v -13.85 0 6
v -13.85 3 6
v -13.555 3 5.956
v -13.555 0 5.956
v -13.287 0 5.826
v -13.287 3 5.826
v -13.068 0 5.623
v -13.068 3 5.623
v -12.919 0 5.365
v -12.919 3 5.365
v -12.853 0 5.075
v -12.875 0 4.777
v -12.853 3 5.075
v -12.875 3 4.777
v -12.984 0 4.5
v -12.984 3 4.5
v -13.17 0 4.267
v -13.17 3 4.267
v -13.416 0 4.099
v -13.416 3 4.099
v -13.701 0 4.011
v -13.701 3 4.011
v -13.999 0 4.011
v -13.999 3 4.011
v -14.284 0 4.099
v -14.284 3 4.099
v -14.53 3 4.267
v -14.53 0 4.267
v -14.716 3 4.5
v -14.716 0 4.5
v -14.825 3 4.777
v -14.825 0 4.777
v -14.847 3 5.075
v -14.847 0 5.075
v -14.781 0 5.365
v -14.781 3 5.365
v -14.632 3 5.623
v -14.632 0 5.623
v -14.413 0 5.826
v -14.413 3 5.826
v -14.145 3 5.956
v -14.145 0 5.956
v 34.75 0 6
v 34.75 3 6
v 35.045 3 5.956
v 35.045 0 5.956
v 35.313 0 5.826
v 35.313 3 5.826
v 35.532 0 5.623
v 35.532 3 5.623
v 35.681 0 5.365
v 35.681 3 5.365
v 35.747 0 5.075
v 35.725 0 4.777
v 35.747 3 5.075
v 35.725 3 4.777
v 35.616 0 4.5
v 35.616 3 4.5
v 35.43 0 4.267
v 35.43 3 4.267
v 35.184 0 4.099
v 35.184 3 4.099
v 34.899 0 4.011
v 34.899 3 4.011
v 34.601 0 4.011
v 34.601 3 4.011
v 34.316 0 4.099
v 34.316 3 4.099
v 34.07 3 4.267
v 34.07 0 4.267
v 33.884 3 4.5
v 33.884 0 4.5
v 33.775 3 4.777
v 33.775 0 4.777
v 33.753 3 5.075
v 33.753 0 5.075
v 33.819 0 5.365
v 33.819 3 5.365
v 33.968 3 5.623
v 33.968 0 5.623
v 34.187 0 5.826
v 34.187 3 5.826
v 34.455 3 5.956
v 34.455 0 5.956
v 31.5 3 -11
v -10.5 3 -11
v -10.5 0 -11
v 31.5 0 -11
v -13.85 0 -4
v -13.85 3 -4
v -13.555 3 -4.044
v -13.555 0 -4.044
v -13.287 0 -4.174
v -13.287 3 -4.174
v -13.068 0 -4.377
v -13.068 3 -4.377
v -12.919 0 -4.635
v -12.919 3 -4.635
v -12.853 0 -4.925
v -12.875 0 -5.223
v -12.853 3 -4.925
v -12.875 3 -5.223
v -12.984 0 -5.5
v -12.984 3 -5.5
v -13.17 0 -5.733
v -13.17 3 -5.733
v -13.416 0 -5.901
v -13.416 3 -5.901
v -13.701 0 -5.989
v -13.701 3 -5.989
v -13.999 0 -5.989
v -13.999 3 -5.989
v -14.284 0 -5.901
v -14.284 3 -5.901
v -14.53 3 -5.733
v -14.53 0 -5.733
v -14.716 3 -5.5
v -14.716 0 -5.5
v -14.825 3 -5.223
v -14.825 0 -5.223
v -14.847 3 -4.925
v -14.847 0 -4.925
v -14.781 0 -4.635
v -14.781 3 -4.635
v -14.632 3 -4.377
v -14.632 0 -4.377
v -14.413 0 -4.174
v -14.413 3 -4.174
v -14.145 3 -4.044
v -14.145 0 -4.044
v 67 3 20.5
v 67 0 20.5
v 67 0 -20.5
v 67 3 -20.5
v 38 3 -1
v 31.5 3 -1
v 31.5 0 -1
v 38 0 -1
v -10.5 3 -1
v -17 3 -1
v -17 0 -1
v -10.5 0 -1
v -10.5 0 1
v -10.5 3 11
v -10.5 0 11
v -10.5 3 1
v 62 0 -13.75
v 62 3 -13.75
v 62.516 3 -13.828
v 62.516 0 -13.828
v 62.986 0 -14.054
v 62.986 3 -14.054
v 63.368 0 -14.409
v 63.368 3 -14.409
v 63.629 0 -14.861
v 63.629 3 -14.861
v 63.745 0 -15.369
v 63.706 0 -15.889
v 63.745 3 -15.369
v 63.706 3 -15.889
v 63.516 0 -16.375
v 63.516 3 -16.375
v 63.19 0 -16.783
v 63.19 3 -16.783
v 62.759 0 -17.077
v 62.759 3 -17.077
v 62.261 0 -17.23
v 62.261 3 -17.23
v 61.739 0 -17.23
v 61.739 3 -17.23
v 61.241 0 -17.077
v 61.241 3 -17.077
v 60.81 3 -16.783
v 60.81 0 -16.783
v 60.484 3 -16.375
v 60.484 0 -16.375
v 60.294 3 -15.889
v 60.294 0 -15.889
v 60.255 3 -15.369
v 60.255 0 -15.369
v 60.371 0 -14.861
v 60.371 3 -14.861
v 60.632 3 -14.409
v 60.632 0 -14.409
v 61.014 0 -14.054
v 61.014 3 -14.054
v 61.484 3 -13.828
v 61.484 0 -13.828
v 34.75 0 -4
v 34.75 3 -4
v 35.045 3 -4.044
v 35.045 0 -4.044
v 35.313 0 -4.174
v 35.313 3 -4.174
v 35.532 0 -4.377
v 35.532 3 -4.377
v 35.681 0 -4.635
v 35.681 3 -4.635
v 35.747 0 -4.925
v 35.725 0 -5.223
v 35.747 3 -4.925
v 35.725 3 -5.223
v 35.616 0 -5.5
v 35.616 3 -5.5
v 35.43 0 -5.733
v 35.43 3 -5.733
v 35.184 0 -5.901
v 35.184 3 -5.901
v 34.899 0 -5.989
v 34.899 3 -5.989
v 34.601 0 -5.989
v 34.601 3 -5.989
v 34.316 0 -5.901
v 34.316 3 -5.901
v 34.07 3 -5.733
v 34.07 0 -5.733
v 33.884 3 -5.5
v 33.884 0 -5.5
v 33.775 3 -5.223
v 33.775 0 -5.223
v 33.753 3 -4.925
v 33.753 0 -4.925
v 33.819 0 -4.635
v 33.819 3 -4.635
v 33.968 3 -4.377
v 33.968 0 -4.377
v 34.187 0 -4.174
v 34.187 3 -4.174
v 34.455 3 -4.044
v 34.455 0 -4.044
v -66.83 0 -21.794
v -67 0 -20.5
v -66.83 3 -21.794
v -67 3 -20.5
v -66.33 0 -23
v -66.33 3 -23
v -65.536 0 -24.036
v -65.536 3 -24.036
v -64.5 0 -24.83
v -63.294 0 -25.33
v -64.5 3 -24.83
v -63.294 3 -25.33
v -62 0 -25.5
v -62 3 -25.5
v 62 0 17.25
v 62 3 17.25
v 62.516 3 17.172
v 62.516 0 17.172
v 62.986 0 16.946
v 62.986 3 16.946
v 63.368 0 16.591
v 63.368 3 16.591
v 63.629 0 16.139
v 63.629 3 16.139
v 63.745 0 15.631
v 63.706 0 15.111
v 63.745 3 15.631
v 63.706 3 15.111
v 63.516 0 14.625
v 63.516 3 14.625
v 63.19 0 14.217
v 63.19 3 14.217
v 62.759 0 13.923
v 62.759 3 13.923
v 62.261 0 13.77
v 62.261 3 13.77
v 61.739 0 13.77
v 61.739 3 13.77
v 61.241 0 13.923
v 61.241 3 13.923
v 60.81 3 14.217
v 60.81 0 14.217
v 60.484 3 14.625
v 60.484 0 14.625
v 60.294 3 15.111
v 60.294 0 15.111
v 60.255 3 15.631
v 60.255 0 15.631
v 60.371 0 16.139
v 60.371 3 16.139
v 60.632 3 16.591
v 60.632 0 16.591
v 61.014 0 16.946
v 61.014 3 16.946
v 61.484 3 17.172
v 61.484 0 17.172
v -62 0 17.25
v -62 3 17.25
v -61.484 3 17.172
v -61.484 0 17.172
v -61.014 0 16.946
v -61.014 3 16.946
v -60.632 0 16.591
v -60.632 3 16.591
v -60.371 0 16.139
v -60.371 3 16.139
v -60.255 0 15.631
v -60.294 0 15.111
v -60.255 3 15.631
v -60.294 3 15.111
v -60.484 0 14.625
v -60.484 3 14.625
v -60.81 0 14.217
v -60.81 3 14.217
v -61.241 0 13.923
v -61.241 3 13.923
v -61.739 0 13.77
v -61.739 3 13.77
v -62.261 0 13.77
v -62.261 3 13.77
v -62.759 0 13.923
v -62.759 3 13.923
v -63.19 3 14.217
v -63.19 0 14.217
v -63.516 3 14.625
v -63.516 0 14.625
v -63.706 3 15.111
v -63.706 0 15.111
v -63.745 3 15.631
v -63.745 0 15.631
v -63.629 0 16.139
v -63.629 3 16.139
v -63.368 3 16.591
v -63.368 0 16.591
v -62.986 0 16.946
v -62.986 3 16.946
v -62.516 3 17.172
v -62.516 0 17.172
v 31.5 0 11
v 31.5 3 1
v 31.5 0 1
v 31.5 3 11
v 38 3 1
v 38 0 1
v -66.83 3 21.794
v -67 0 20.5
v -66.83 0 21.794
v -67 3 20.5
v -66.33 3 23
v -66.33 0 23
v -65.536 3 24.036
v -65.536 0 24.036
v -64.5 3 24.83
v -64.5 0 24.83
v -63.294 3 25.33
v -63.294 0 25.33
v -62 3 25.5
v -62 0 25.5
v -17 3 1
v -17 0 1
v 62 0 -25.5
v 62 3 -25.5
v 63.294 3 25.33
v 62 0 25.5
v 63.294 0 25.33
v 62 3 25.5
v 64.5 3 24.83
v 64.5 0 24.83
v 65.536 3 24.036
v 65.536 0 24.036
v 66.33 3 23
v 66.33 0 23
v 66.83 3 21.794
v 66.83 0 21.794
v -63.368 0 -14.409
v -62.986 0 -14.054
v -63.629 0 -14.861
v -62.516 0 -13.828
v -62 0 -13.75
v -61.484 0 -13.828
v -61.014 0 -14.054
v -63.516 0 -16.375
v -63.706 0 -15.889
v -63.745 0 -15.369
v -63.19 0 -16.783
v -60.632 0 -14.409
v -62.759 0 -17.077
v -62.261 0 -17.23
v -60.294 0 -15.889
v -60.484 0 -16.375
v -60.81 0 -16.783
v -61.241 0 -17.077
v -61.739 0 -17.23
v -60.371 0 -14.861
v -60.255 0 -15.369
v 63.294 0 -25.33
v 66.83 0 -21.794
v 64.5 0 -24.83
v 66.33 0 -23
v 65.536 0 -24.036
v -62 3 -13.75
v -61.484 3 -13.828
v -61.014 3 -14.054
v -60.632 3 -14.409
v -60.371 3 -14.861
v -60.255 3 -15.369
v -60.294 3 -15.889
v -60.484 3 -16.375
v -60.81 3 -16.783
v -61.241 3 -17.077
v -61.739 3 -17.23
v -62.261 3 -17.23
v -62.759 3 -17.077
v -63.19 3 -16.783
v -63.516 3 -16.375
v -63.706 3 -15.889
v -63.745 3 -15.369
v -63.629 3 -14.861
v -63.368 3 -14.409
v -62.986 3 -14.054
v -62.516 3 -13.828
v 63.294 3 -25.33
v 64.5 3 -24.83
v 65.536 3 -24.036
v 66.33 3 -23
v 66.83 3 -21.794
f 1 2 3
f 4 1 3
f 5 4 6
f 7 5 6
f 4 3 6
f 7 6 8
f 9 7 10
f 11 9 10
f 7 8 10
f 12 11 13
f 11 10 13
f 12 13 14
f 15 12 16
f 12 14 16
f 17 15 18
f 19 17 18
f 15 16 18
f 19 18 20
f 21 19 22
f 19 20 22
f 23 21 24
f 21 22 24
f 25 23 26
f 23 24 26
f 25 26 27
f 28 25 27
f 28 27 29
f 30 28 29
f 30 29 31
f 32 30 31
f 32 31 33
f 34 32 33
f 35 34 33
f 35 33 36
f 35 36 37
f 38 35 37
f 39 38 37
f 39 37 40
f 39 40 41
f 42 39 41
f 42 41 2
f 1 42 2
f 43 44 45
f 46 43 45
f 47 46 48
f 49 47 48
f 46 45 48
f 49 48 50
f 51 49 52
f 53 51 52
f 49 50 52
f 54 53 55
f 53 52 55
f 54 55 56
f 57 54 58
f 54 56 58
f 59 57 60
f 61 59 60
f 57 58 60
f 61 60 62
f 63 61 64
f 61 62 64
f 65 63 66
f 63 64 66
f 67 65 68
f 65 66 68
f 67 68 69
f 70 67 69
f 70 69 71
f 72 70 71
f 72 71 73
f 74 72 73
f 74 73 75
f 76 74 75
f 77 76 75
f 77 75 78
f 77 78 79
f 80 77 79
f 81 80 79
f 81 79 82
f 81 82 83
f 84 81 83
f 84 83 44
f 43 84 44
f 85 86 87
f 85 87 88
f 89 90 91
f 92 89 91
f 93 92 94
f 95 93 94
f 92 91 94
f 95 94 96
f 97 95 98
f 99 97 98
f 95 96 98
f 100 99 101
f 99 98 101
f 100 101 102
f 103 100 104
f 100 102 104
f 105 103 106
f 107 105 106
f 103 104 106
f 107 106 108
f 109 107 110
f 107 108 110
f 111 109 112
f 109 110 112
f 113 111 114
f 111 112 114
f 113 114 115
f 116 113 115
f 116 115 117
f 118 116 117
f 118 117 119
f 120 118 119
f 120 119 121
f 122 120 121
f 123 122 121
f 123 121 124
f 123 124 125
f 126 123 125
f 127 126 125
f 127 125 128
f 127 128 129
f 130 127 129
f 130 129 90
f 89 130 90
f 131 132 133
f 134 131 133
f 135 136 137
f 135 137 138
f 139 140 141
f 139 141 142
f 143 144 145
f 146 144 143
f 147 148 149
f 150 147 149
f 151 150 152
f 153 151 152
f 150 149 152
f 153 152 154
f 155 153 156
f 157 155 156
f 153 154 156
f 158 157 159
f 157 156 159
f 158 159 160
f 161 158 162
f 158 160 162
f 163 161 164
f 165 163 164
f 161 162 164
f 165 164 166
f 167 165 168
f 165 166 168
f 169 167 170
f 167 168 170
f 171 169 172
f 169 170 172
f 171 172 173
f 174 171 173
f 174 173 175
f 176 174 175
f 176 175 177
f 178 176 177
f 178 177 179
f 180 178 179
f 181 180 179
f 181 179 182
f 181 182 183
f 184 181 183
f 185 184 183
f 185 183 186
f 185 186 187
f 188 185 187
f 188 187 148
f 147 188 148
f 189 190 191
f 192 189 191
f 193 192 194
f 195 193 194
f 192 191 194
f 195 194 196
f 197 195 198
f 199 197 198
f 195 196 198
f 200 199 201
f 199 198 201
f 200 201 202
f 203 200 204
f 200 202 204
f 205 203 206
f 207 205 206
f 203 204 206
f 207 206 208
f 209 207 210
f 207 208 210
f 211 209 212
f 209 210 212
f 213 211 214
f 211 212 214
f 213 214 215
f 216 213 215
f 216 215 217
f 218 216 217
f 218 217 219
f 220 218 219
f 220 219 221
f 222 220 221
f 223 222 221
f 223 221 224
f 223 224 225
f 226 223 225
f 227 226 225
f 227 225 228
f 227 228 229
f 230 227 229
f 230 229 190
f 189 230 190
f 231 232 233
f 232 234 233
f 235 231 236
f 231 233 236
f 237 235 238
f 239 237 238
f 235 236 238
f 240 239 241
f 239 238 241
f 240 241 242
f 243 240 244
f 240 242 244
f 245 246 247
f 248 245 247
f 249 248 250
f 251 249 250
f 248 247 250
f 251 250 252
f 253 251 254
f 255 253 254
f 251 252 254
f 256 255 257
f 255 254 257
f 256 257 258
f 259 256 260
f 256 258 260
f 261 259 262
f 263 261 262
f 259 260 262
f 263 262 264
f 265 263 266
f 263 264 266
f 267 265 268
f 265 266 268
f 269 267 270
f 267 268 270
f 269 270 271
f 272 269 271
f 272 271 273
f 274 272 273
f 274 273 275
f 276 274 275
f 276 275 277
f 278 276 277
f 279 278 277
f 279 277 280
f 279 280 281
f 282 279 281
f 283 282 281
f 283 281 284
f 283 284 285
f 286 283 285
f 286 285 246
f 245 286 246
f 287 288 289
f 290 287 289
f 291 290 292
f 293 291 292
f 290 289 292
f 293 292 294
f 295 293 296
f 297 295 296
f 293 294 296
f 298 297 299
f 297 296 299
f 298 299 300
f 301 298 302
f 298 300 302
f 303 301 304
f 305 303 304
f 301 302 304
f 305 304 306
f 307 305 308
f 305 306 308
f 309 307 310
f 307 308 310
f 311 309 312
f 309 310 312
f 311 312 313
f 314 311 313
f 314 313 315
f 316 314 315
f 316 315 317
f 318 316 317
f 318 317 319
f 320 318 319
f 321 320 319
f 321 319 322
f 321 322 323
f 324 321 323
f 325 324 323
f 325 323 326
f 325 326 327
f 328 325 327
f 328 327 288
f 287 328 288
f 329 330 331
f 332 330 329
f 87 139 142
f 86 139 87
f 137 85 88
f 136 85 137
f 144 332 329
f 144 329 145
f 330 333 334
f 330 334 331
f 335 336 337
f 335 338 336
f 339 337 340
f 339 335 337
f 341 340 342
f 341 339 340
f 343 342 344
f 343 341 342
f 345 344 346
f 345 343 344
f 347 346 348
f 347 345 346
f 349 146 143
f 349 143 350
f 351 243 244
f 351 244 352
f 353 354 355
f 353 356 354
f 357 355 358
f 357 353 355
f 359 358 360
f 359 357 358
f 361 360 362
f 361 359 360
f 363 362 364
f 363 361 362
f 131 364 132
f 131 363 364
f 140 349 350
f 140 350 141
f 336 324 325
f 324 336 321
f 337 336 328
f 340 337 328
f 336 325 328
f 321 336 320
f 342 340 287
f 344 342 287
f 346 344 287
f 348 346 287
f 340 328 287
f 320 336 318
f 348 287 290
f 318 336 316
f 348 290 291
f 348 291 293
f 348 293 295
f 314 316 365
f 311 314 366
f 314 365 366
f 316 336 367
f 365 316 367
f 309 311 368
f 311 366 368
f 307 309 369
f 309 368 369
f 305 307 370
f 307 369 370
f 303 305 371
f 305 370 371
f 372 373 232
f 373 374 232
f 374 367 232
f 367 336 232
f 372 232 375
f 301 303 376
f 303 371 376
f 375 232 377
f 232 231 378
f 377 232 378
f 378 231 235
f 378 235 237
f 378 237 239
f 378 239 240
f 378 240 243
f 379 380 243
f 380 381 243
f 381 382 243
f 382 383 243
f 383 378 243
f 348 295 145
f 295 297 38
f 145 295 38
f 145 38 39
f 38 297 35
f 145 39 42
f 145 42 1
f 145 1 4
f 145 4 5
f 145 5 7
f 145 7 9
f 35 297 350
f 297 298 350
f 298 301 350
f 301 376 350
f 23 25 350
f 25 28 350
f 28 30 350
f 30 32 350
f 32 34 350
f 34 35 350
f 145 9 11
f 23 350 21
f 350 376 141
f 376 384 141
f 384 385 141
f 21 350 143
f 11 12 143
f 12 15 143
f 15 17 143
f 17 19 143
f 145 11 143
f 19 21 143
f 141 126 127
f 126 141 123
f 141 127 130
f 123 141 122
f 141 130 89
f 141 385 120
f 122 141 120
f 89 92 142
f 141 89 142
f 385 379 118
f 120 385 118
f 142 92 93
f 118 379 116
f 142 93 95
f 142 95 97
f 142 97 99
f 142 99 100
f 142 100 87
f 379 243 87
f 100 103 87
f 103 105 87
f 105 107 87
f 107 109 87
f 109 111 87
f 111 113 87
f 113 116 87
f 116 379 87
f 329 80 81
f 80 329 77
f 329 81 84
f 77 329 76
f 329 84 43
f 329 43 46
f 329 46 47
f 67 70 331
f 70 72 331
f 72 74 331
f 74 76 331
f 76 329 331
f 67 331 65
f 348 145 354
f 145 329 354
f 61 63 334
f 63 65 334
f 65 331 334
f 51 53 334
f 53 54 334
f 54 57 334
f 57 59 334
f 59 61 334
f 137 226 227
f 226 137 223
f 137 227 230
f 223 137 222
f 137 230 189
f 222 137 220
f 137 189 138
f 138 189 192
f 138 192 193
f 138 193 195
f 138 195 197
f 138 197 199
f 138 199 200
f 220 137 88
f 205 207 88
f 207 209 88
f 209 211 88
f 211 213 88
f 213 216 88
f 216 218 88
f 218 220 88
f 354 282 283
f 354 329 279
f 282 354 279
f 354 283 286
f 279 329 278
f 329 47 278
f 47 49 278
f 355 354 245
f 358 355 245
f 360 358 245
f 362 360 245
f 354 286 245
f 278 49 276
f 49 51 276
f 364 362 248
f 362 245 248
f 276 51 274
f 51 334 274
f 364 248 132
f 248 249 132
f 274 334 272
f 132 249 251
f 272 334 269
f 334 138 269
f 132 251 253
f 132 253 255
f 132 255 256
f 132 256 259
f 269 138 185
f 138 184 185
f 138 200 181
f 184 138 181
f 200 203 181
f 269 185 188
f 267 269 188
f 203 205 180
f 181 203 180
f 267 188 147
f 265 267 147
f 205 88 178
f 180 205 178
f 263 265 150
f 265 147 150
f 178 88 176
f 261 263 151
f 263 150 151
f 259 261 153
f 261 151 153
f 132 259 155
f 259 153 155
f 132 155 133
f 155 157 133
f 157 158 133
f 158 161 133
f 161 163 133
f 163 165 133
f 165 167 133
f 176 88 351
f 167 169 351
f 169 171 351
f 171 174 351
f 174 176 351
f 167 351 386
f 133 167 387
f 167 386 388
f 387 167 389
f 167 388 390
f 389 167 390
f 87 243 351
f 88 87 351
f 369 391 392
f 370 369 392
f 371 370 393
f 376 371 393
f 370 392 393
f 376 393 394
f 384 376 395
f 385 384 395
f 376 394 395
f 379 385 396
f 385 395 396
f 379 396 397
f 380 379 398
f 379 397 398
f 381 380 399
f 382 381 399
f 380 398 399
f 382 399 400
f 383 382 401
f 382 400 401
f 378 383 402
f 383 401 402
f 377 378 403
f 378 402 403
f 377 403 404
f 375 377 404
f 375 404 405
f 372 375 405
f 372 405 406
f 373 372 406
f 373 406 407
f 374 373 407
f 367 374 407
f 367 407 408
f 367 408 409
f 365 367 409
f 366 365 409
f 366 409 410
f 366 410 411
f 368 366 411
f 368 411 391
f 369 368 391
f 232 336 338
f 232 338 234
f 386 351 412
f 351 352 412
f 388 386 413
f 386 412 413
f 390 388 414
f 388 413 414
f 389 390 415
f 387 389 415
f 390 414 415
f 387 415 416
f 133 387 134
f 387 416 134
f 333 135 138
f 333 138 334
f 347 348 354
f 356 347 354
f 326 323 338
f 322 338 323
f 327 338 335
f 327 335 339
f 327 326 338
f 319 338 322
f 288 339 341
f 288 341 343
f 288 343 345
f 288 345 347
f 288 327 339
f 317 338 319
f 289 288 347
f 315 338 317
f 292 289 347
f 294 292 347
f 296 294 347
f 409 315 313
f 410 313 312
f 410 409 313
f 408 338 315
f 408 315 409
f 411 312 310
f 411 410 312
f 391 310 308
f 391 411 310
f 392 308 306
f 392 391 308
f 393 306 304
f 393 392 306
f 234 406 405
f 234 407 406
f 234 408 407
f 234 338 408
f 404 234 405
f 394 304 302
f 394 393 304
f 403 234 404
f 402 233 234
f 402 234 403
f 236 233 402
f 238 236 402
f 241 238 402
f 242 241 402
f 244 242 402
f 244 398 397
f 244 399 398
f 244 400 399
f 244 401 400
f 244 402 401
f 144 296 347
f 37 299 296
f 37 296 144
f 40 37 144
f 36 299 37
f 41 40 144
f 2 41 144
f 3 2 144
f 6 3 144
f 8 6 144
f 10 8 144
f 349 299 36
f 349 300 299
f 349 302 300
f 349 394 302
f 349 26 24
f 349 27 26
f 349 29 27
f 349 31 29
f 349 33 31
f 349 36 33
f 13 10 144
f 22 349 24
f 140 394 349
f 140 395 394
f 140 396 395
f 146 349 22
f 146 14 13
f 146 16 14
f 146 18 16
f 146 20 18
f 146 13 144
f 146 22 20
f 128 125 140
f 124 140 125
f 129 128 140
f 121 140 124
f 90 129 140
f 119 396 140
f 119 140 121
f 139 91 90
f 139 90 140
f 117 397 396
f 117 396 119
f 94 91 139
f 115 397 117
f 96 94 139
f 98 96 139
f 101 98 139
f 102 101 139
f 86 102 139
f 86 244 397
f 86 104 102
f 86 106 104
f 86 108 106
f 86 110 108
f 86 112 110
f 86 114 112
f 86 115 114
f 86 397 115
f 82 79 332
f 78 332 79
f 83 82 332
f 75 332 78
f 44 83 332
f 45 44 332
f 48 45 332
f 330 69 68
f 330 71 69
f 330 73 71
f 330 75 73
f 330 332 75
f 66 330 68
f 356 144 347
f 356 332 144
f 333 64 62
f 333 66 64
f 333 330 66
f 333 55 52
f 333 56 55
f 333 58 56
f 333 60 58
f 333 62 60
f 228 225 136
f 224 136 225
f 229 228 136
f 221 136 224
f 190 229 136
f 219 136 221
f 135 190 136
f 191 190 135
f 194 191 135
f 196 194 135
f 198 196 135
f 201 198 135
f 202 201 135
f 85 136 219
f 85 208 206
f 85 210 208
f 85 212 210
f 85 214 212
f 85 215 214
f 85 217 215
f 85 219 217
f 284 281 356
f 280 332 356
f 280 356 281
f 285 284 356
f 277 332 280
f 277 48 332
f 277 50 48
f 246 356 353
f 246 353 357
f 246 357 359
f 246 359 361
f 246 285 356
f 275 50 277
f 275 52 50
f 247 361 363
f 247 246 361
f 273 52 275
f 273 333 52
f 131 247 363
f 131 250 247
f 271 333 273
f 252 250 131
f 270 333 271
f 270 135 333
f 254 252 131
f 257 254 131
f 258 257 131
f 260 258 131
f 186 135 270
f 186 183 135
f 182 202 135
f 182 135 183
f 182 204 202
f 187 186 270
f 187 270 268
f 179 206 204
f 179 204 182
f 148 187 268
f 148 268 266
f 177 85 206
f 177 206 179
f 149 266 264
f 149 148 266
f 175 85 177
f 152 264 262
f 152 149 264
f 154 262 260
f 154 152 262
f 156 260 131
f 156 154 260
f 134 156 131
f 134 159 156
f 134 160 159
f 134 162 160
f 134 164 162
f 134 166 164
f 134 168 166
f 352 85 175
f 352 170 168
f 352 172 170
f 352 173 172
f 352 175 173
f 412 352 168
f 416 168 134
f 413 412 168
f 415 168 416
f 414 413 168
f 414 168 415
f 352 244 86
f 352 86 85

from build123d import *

# Parameters (mm, degrees)
SKETCH_1_W          = 134
SKETCH_1_H          = 51
EXTRUDE_1_DEPTH     = 3
CUT_EXTRUDE_1_REACH = 73.751
SKETCH_2_R          = 1.75
CUT_EXTRUDE_2_REACH = 73.751
SKETCH_3_R          = 1
FILLET_1_R          = 5


with BuildPart() as part:
    # 스케치1 → 보스-돌출1 (new body)
    with BuildSketch(Plane(origin=(0, 0, 0), x_dir=(1, 0, 0), z_dir=(0, 1, 0))):
        Rectangle(SKETCH_1_W, SKETCH_1_H)
    extrude(amount=EXTRUDE_1_DEPTH)

    # 스케치2 → 컷-돌출1 (cut, up to next)
    with BuildSketch(Plane(origin=(0, 3, 0), x_dir=(1, 0, 0), z_dir=(0, 1, 0)), mode=Mode.PRIVATE) as cut_extrude_1_sk1:
        with Locations(Location((-62, 15.5, 0), (0, 0, 270))):
            Circle(SKETCH_2_R)
    cut_extrude_1_tool1 = extrude(cut_extrude_1_sk1.sketch, amount=-CUT_EXTRUDE_1_REACH, mode=Mode.PRIVATE) & part.part
    # 스케치2 → 컷-돌출1 (cut, up to next)
    with BuildSketch(Plane(origin=(0, 3, 0), x_dir=(1, 0, 0), z_dir=(0, 1, 0)), mode=Mode.PRIVATE) as cut_extrude_1_sk2:
        with Locations(Location((-62, -15.5, 0), (0, 0, 270))):
            Circle(SKETCH_2_R)
    cut_extrude_1_tool2 = extrude(cut_extrude_1_sk2.sketch, amount=-CUT_EXTRUDE_1_REACH, mode=Mode.PRIVATE) & part.part
    # 스케치2 → 컷-돌출1 (cut, up to next)
    with BuildSketch(Plane(origin=(0, 3, 0), x_dir=(1, 0, 0), z_dir=(0, 1, 0)), mode=Mode.PRIVATE) as cut_extrude_1_sk3:
        with Locations(Location((62, 15.5, 0), (0, 0, 270))):
            Circle(SKETCH_2_R)
    cut_extrude_1_tool3 = extrude(cut_extrude_1_sk3.sketch, amount=-CUT_EXTRUDE_1_REACH, mode=Mode.PRIVATE) & part.part
    # 스케치2 → 컷-돌출1 (cut, up to next)
    with BuildSketch(Plane(origin=(0, 3, 0), x_dir=(1, 0, 0), z_dir=(0, 1, 0)), mode=Mode.PRIVATE) as cut_extrude_1_sk4:
        with Locations(Location((62, -15.5, 0), (0, 0, 270))):
            Circle(SKETCH_2_R)
    cut_extrude_1_tool4 = extrude(cut_extrude_1_sk4.sketch, amount=-CUT_EXTRUDE_1_REACH, mode=Mode.PRIVATE) & part.part
    add(cut_extrude_1_tool1.solids().sort_by_distance((-62, 3, -15.5))[0], mode=Mode.SUBTRACT)
    add(cut_extrude_1_tool2.solids().sort_by_distance((-62, 3, 15.5))[0], mode=Mode.SUBTRACT)
    add(cut_extrude_1_tool3.solids().sort_by_distance((62, 3, -15.5))[0], mode=Mode.SUBTRACT)
    add(cut_extrude_1_tool4.solids().sort_by_distance((62, 3, 15.5))[0], mode=Mode.SUBTRACT)

    # 스케치3 → 컷-돌출2 (cut, up to next)
    with BuildSketch(Plane(origin=(0, 3, 0), x_dir=(1, 0, 0), z_dir=(0, 1, 0)), mode=Mode.PRIVATE) as cut_extrude_2_sk1:
        with Locations(Location((-13.85, 5, 0), (0, 0, 270))):
            Circle(SKETCH_3_R)
    cut_extrude_2_tool1 = extrude(cut_extrude_2_sk1.sketch, amount=-CUT_EXTRUDE_2_REACH, mode=Mode.PRIVATE) & part.part
    # 스케치3 → 컷-돌출2 (cut, up to next)
    with BuildSketch(Plane(origin=(0, 3, 0), x_dir=(1, 0, 0), z_dir=(0, 1, 0)), mode=Mode.PRIVATE) as cut_extrude_2_sk2:
        with Locations(Location((-13.85, -5, 0), (0, 0, 270))):
            Circle(SKETCH_3_R)
    cut_extrude_2_tool2 = extrude(cut_extrude_2_sk2.sketch, amount=-CUT_EXTRUDE_2_REACH, mode=Mode.PRIVATE) & part.part
    # 스케치3 → 컷-돌출2 (cut, up to next)
    with BuildSketch(Plane(origin=(0, 3, 0), x_dir=(1, 0, 0), z_dir=(0, 1, 0)), mode=Mode.PRIVATE) as cut_extrude_2_sk3:
        with Locations(Location((34.75, 5, 0), (0, 0, 270))):
            Circle(SKETCH_3_R)
    cut_extrude_2_tool3 = extrude(cut_extrude_2_sk3.sketch, amount=-CUT_EXTRUDE_2_REACH, mode=Mode.PRIVATE) & part.part
    # 스케치3 → 컷-돌출2 (cut, up to next)
    with BuildSketch(Plane(origin=(0, 3, 0), x_dir=(1, 0, 0), z_dir=(0, 1, 0)), mode=Mode.PRIVATE) as cut_extrude_2_sk4:
        with Locations(Location((34.75, -5, 0), (0, 0, 270))):
            Circle(SKETCH_3_R)
    cut_extrude_2_tool4 = extrude(cut_extrude_2_sk4.sketch, amount=-CUT_EXTRUDE_2_REACH, mode=Mode.PRIVATE) & part.part
    # 스케치3 → 컷-돌출2 (cut, up to next)
    with BuildSketch(Plane(origin=(0, 3, 0), x_dir=(1, 0, 0), z_dir=(0, 1, 0)), mode=Mode.PRIVATE) as cut_extrude_2_sk5:
        Polygon((-10.5, 11), (31.5, 11), (31.5, 1), (38, 1), (38, -1), (31.5, -1), (31.5, -11), (-10.5, -11), (-10.5, -1), (-17, -1), (-17, 1), (-10.5, 1), align=None)
    cut_extrude_2_tool5 = extrude(cut_extrude_2_sk5.sketch, amount=-CUT_EXTRUDE_2_REACH, mode=Mode.PRIVATE) & part.part
    add(cut_extrude_2_tool1.solids().sort_by_distance((-13.85, 3, -5))[0], mode=Mode.SUBTRACT)
    add(cut_extrude_2_tool2.solids().sort_by_distance((-13.85, 3, 5))[0], mode=Mode.SUBTRACT)
    add(cut_extrude_2_tool3.solids().sort_by_distance((34.75, 3, -5))[0], mode=Mode.SUBTRACT)
    add(cut_extrude_2_tool4.solids().sort_by_distance((34.75, 3, 5))[0], mode=Mode.SUBTRACT)
    add(cut_extrude_2_tool5.solids().sort_by_distance((10.5, 3, 0))[0], mode=Mode.SUBTRACT)

    # 필렛1
    fillet_1_edges = [part.edges().sort_by_distance(p)[0] for p in [
        (67, 1.5, 25.5),
        (-67, 1.5, 25.5),
        (-67, 1.5, -25.5),
        (67, 1.5, -25.5),
    ]]
    fillet(fillet_1_edges, radius=FILLET_1_R)


solid = part.part
